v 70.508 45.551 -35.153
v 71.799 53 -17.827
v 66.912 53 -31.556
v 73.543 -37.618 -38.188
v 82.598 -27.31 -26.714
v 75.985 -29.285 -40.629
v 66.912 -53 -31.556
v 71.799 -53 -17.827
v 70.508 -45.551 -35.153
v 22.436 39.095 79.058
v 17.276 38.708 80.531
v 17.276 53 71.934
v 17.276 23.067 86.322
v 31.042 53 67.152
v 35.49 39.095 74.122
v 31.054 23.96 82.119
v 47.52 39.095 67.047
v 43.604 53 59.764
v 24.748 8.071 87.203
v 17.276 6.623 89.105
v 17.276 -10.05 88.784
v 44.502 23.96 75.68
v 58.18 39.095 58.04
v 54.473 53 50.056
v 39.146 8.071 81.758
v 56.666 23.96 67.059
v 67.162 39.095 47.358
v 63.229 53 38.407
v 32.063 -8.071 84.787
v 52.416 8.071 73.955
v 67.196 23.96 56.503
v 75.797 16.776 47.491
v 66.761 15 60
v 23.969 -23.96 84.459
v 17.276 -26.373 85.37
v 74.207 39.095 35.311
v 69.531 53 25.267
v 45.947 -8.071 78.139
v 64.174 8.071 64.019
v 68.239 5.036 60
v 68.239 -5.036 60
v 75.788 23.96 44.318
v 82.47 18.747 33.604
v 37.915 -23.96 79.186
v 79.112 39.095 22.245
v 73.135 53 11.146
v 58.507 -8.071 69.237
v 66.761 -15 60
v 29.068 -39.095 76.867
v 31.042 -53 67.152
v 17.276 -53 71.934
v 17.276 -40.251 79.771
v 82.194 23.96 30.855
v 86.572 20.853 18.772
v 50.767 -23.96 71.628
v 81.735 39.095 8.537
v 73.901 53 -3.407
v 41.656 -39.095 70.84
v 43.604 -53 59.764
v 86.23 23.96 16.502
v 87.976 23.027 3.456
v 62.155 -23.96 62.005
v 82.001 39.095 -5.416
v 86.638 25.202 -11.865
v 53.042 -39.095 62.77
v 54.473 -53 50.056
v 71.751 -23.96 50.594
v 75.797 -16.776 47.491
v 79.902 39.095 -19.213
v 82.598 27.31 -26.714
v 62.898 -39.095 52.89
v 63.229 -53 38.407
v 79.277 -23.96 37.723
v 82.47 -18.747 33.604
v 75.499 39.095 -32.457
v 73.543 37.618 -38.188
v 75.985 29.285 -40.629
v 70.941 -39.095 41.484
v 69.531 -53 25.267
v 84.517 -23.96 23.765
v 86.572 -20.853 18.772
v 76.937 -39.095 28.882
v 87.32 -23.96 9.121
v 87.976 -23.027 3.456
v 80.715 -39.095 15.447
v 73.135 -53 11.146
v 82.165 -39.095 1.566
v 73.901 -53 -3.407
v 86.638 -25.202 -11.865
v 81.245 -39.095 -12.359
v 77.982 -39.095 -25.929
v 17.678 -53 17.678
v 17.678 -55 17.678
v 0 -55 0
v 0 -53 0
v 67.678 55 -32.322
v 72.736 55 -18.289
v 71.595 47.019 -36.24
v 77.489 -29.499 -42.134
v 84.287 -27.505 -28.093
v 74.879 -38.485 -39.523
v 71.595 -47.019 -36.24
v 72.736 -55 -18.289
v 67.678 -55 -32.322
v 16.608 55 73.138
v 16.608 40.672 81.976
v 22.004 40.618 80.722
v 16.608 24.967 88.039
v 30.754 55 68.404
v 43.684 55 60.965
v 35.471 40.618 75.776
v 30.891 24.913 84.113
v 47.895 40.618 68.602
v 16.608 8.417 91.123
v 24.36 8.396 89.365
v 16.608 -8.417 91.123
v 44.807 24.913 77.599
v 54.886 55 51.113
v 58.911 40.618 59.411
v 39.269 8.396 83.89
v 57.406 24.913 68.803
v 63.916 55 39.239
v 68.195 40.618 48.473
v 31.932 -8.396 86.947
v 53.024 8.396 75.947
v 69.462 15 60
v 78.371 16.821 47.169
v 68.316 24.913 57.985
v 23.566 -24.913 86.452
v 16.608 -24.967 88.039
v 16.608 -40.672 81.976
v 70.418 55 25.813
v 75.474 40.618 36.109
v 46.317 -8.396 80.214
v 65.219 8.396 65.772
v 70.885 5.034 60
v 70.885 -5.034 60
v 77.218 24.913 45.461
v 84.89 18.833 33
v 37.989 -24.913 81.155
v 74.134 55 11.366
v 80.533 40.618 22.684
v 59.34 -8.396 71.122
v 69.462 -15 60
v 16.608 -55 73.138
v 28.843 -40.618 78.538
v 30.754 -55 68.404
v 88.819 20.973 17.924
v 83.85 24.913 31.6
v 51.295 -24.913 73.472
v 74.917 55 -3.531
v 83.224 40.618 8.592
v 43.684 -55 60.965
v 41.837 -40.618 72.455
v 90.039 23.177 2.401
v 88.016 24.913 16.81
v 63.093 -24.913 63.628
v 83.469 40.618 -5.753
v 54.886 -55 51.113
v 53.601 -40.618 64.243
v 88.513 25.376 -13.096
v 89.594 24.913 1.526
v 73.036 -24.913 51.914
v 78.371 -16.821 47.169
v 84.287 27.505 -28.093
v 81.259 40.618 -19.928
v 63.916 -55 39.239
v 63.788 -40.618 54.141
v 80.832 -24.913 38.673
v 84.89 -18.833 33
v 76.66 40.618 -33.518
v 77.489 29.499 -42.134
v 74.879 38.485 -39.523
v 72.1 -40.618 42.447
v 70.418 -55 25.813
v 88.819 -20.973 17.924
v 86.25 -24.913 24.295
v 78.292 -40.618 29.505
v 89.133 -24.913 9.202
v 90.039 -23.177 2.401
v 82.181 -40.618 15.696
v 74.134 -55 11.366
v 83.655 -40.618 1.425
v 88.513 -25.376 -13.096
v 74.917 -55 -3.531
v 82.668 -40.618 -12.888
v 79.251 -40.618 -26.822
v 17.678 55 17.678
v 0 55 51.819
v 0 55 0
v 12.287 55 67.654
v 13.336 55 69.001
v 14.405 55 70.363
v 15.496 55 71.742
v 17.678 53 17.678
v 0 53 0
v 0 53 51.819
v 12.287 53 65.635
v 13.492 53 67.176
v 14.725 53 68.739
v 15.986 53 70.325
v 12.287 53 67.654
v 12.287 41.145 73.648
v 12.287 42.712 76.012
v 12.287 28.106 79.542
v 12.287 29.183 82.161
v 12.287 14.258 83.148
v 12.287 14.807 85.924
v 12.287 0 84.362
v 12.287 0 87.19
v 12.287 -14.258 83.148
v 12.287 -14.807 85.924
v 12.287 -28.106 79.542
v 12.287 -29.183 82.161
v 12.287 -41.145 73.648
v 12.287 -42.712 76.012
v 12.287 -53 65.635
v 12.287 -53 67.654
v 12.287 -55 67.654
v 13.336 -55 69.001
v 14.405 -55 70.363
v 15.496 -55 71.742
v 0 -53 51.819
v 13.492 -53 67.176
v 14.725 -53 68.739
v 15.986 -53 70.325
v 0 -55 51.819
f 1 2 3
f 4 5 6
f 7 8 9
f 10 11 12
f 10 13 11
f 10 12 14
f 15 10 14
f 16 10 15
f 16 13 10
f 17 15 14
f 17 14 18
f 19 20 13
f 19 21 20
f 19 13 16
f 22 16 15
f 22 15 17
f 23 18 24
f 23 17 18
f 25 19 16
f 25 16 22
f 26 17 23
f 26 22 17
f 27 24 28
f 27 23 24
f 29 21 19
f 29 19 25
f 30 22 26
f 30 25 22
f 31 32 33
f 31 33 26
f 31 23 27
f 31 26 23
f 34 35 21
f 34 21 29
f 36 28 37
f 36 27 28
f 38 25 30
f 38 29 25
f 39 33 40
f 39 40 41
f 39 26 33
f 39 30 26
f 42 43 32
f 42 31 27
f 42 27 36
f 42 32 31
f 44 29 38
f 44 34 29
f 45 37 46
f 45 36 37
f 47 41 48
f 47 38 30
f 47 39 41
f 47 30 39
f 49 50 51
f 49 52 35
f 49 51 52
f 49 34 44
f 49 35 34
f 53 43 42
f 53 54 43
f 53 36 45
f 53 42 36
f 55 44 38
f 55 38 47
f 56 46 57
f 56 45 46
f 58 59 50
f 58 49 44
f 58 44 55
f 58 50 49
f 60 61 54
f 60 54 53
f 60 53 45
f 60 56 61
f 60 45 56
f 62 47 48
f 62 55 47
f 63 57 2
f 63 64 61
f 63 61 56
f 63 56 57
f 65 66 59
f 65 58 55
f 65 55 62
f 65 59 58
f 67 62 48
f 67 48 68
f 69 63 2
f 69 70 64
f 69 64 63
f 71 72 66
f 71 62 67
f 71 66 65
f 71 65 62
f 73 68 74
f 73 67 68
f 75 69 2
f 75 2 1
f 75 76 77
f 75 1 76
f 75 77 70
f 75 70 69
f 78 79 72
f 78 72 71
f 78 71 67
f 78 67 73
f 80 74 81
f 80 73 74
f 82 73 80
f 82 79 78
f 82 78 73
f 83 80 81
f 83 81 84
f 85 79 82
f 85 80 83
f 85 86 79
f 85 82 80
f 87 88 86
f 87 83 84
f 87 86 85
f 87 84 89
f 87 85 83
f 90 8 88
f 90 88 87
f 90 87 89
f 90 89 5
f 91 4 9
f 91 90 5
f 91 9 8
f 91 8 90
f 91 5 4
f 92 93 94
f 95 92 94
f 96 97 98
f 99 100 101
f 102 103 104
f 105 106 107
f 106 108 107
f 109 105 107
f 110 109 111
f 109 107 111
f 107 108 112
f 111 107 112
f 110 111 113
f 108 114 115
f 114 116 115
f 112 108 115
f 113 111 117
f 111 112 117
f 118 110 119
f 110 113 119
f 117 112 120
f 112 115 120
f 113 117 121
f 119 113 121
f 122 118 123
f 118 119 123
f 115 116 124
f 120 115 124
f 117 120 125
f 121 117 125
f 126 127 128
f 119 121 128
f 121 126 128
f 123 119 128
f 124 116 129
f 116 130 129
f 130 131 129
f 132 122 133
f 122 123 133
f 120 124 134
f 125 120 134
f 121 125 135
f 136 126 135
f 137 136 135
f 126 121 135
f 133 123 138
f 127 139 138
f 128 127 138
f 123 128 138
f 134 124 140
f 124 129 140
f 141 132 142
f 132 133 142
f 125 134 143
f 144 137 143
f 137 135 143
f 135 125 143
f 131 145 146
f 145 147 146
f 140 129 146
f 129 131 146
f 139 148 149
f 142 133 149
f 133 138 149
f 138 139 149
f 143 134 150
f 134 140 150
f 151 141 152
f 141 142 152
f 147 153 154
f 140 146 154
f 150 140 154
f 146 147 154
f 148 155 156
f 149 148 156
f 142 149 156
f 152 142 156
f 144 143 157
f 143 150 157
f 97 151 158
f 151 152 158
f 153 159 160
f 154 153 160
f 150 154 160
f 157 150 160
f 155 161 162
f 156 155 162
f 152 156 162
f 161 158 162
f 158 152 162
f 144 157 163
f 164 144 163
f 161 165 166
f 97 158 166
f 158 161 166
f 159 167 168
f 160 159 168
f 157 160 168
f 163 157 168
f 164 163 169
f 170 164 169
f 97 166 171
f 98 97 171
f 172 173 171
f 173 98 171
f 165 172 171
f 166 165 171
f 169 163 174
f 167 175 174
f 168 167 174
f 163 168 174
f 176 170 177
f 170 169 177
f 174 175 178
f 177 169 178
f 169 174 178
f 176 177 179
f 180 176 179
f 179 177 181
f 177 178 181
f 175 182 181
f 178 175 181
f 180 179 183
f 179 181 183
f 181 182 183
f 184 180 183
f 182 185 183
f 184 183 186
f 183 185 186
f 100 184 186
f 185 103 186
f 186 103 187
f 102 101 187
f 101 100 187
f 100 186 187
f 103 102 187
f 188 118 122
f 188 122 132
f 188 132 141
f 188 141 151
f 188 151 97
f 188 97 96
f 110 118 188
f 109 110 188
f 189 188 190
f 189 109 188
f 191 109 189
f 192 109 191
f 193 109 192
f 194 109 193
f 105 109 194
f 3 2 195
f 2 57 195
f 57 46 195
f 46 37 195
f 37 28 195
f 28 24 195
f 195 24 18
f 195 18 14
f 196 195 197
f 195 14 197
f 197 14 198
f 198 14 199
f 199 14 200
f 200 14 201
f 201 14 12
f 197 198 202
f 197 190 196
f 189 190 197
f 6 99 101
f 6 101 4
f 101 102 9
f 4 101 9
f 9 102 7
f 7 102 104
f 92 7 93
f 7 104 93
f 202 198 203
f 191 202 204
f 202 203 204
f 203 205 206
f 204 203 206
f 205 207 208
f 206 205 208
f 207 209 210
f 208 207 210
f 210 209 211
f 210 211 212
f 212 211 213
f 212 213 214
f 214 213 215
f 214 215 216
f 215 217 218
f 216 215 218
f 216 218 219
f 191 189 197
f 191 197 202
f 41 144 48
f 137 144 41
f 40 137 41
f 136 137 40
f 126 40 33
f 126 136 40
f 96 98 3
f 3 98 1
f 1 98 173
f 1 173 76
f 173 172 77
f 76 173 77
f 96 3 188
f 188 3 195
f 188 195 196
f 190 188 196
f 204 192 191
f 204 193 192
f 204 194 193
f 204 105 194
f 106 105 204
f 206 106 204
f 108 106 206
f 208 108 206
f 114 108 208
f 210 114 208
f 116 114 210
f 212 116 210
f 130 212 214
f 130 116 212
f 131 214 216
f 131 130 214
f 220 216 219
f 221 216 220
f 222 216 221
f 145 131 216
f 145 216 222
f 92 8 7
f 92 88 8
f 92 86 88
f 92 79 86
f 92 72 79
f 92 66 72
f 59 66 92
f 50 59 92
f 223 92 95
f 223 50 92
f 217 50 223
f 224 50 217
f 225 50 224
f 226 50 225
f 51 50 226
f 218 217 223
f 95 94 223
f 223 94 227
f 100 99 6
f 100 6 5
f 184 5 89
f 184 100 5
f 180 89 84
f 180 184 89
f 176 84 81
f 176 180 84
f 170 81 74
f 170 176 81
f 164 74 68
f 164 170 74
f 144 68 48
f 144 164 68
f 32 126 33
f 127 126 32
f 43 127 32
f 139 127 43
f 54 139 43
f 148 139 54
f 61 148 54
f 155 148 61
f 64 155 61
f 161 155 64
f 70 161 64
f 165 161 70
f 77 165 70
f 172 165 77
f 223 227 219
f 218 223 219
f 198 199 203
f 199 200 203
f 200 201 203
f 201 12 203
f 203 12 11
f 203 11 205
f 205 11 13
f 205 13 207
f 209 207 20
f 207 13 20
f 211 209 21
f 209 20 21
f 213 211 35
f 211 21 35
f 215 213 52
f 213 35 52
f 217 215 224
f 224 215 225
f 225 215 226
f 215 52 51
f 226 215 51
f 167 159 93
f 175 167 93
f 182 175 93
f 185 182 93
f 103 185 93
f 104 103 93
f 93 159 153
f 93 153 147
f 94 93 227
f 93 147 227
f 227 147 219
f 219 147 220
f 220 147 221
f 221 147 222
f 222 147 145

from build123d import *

# Parameters (mm, degrees)
OBR_T1_ANGLE                = 180
WYTNIJ_WYCI_GNI_CIE1_DEPTH  = 172.464281995
WYTNIJ_WYCI_GNI_CIE2_DEPTH  = 147.710676959
SFAZOWANIE1_SIZE            = 5
SKORUPA1_T                  = -2
DODANIE_WYCI_GNI_CIE1_DEPTH = 2


with BuildPart() as part:
    # Szkic1 → Obrót1 (revolve)
    with BuildSketch(Plane(origin=(0, 0, 0), x_dir=(0, 0, -1), z_dir=(1, 0, 0))):
        with BuildLine():
            Line((0, -55), (0, 55))
            Line((0, 55), (-75, 55))
            ThreePointArc((-75, 55), (-93.005376189, 0), (-75, -55))
            Line((-75, -55), (0, -55))
        make_face()
    revolve(axis=Axis((0, -55, 0), (0, 1, 0)), revolution_arc=OBR_T1_ANGLE)

    # Szkic2 → Wytnij-wyciągnięcie1 (cut, through all)
    with BuildSketch(Plane.XZ.offset(55)):
        Polygon((0, 0), (0, 40), (12.287280664, 48.603646545), (12.287280664, 99.487677337), (-26.065901524, 99.487677337), (-26.065901524, -104.75854766), (87.353699516, -104.75854766), (87.353699516, -51.998360457), (17.67766953, 17.67766953), align=None)
    extrude(amount=-WYTNIJ_WYCI_GNI_CIE1_DEPTH, mode=Mode.SUBTRACT)

    # Szkic3 → Wytnij-wyciągnięcie2 (cut, through all)
    with BuildSketch(Plane(origin=(100, 0, 0), x_dir=(0, 0, -1), z_dir=(1, 0, 0))):
        Polygon((-60, -15), (-60, 15), (45.666627767, 30), (45.666627767, -30), align=None)
    extrude(amount=-WYTNIJ_WYCI_GNI_CIE2_DEPTH, mode=Mode.SUBTRACT)

    # Sfazowanie1
    # the kernel refuses this chamfer: 5, 4.450979534 mm, written as the material it takes off along each edge
    with BuildSketch(Plane(origin=(12.287280664, 0, 0), x_dir=(0, 0.7023997796774998, 0.7117826560889214), z_dir=(0, 0.7117826560889214, -0.7023997796774998))) as sfazowanie1_piece_1:
        with BuildLine():
            Line((92.190144451 - SFAZOWANIE1_SIZE, 0), (91.510568486, 4.320424035))
            ThreePointArc((91.510568486, 4.320424035), (91.866596239, 2.222319448), (92.190144451, 0))
            Line((92.190144451, 0), (92.190144451 - SFAZOWANIE1_SIZE, 0))
        make_face()
    revolve(axis=Axis((12.287280664, 0, 0), (1, 0, 0)), revolution_arc=89.239714317, mode=Mode.SUBTRACT)

    # Skorupa1
    skorupa1_openings = [part.faces().sort_by_distance(p)[0] for p in [
        (0, 37.799975499, 20.551470825),
        (44.318791783, 39.564539913, -8.963452724),
        (12.287280664, 0, 66.554150501),
        (8.951756718, 38.623299359, 8.951756718),
        (6.176749303, 36.112578818, 44.325006424),
        (8.951756718, -38.623299359, 8.951756718),
        (44.318791783, -39.564539913, -8.963452724),
        (6.176749303, -36.112578818, 44.325006424),
        (0, -37.799975499, 20.551470825),
        (41.411625019, 0, 60),
        (50.400096072, -20.67683416, 20.009871862),
        (50.400096072, 20.67683416, 20.009871862),
    ]]
    offset(amount=SKORUPA1_T, openings=skorupa1_openings)

    # Szkic4 → Dodanie-wyciągnięcie1 (add)
    with BuildSketch(Plane.XZ.offset(55)):
        Polygon((0, 40), (0, 51.81910108), (12.287280664, 67.654425497), (12.287280664, 48.603646545), align=None)
    dodanie_wyci_gni_cie1 = extrude(amount=-DODANIE_WYCI_GNI_CIE1_DEPTH)

    # Lustro1: Dodanie-wyciągnięcie1 across plane
    add(dodanie_wyci_gni_cie1.mirror(Plane.ZX))


solid = part.part
